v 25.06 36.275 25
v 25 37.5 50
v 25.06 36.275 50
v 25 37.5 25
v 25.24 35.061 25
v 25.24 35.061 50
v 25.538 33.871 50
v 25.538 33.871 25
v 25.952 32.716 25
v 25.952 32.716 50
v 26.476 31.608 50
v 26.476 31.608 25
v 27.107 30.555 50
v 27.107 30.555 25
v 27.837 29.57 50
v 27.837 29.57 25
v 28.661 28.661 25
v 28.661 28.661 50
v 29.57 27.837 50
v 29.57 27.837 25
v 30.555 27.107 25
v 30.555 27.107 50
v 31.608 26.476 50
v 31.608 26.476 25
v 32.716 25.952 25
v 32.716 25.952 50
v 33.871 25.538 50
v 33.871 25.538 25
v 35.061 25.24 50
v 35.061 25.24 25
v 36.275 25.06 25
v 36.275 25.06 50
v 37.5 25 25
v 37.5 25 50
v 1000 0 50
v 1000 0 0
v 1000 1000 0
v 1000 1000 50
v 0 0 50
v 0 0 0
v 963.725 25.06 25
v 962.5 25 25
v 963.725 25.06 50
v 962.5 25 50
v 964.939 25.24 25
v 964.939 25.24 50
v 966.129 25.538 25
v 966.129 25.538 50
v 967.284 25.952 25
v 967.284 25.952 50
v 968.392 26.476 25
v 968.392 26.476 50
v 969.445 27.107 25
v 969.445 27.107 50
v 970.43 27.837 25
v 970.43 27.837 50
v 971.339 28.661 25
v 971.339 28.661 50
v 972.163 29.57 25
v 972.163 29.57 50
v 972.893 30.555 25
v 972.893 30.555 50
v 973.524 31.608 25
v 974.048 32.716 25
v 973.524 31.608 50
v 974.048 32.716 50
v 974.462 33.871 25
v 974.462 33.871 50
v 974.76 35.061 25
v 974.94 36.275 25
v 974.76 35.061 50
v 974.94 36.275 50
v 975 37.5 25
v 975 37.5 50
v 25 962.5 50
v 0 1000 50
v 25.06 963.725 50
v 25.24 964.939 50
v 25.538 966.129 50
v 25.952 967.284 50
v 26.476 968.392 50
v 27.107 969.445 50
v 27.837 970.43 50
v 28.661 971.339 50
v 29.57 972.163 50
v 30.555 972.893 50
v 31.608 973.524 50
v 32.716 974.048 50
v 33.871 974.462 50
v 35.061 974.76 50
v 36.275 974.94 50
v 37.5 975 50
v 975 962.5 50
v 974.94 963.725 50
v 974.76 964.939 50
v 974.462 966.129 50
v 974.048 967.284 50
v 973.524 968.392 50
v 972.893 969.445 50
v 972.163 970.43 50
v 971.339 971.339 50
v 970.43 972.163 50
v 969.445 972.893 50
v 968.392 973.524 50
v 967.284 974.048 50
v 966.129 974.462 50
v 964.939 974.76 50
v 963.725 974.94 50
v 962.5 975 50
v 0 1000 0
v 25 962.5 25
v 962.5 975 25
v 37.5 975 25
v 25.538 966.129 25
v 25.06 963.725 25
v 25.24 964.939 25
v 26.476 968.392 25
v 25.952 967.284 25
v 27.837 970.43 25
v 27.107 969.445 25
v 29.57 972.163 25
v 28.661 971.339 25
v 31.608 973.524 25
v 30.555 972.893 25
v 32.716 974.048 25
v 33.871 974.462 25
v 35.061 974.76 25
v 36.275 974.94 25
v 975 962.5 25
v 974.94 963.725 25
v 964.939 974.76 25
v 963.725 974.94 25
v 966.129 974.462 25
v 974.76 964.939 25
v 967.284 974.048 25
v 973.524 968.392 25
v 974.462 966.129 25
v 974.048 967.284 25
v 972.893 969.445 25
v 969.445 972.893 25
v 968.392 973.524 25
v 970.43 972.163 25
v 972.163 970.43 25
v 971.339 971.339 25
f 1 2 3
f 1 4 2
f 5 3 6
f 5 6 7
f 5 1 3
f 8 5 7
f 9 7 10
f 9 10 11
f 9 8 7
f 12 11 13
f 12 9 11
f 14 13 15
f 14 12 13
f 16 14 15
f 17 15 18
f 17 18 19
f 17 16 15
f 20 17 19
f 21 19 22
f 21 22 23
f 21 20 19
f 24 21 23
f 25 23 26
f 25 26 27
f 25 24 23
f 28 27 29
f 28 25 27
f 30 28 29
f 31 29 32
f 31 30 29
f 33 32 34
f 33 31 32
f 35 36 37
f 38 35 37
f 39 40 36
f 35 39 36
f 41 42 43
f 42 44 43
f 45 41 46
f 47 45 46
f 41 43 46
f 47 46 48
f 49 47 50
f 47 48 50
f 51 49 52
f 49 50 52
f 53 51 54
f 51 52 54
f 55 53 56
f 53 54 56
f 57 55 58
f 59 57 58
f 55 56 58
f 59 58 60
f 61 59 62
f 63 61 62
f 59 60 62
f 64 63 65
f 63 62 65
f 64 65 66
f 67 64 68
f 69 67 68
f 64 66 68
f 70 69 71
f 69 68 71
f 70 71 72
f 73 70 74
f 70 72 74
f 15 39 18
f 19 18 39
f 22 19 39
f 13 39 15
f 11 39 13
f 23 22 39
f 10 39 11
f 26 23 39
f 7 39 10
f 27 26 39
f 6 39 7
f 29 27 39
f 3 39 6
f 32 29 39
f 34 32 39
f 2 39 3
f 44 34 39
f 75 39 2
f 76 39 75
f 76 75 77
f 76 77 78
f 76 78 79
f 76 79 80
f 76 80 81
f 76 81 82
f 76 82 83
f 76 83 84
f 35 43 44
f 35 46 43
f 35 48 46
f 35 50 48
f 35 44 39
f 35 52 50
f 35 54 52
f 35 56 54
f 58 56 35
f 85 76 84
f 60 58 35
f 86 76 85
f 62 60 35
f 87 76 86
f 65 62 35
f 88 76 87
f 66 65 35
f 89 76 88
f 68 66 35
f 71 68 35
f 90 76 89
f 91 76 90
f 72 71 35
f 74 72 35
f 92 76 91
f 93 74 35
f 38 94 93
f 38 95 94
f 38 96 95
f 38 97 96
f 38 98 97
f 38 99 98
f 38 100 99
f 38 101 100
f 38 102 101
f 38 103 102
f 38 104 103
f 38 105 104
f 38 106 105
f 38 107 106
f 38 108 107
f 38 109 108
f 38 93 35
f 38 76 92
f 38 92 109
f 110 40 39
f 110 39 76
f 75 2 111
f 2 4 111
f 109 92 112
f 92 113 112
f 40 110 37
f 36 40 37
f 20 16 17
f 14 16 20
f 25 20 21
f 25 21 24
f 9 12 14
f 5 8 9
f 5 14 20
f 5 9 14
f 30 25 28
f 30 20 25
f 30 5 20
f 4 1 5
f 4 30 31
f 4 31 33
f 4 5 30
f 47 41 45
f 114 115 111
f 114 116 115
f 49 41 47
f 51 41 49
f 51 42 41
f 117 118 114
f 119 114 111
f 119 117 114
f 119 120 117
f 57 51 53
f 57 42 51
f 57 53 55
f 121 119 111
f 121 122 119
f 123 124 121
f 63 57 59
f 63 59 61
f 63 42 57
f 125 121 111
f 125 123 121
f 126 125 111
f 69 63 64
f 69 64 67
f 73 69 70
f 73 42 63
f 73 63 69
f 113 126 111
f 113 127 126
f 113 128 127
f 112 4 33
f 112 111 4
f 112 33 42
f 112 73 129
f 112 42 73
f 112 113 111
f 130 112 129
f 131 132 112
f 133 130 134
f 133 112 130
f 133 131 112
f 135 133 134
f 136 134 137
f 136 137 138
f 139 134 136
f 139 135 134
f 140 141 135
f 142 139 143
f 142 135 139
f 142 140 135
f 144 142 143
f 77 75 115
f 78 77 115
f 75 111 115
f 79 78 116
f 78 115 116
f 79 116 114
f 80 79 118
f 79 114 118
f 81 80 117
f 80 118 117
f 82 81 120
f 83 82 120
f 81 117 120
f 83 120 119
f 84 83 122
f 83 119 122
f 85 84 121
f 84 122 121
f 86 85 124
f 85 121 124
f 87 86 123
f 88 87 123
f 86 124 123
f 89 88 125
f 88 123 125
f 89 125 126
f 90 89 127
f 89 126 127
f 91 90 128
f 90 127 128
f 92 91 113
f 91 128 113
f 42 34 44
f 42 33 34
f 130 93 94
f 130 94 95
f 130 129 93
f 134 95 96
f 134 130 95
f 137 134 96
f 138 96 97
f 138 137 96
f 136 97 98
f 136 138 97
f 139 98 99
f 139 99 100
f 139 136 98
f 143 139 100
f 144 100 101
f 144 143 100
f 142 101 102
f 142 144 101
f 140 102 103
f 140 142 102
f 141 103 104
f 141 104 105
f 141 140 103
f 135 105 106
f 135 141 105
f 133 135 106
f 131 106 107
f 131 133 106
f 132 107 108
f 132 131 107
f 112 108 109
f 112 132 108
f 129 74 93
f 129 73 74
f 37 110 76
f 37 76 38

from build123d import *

# Parameters (mm, degrees)
F0_W     = 1000
F0_H     = 1000
F1_DEPTH = 50
F2_T     = -25
F3_R     = 12.5


with BuildPart() as f1:
    # F0 (on Top) → F1 (new body)
    with BuildSketch(Plane.XY):
        with Locations((500, 500)):
            Rectangle(F0_W, F0_H)
    extrude(amount=F1_DEPTH)

    # F2
    f2_openings = [f1.faces().sort_by_distance(p)[0] for p in [
        (500, 500, 50),
    ]]
    offset(amount=F2_T, openings=f2_openings)

    # F3
    f3_edges = [f1.edges().sort_by_distance(p)[0] for p in [
        (25, 975, 37.5),
        (975, 975, 37.5),
        (975, 25, 37.5),
        (25, 25, 37.5),
    ]]
    fillet(f3_edges, radius=F3_R)


solid = f1.part
